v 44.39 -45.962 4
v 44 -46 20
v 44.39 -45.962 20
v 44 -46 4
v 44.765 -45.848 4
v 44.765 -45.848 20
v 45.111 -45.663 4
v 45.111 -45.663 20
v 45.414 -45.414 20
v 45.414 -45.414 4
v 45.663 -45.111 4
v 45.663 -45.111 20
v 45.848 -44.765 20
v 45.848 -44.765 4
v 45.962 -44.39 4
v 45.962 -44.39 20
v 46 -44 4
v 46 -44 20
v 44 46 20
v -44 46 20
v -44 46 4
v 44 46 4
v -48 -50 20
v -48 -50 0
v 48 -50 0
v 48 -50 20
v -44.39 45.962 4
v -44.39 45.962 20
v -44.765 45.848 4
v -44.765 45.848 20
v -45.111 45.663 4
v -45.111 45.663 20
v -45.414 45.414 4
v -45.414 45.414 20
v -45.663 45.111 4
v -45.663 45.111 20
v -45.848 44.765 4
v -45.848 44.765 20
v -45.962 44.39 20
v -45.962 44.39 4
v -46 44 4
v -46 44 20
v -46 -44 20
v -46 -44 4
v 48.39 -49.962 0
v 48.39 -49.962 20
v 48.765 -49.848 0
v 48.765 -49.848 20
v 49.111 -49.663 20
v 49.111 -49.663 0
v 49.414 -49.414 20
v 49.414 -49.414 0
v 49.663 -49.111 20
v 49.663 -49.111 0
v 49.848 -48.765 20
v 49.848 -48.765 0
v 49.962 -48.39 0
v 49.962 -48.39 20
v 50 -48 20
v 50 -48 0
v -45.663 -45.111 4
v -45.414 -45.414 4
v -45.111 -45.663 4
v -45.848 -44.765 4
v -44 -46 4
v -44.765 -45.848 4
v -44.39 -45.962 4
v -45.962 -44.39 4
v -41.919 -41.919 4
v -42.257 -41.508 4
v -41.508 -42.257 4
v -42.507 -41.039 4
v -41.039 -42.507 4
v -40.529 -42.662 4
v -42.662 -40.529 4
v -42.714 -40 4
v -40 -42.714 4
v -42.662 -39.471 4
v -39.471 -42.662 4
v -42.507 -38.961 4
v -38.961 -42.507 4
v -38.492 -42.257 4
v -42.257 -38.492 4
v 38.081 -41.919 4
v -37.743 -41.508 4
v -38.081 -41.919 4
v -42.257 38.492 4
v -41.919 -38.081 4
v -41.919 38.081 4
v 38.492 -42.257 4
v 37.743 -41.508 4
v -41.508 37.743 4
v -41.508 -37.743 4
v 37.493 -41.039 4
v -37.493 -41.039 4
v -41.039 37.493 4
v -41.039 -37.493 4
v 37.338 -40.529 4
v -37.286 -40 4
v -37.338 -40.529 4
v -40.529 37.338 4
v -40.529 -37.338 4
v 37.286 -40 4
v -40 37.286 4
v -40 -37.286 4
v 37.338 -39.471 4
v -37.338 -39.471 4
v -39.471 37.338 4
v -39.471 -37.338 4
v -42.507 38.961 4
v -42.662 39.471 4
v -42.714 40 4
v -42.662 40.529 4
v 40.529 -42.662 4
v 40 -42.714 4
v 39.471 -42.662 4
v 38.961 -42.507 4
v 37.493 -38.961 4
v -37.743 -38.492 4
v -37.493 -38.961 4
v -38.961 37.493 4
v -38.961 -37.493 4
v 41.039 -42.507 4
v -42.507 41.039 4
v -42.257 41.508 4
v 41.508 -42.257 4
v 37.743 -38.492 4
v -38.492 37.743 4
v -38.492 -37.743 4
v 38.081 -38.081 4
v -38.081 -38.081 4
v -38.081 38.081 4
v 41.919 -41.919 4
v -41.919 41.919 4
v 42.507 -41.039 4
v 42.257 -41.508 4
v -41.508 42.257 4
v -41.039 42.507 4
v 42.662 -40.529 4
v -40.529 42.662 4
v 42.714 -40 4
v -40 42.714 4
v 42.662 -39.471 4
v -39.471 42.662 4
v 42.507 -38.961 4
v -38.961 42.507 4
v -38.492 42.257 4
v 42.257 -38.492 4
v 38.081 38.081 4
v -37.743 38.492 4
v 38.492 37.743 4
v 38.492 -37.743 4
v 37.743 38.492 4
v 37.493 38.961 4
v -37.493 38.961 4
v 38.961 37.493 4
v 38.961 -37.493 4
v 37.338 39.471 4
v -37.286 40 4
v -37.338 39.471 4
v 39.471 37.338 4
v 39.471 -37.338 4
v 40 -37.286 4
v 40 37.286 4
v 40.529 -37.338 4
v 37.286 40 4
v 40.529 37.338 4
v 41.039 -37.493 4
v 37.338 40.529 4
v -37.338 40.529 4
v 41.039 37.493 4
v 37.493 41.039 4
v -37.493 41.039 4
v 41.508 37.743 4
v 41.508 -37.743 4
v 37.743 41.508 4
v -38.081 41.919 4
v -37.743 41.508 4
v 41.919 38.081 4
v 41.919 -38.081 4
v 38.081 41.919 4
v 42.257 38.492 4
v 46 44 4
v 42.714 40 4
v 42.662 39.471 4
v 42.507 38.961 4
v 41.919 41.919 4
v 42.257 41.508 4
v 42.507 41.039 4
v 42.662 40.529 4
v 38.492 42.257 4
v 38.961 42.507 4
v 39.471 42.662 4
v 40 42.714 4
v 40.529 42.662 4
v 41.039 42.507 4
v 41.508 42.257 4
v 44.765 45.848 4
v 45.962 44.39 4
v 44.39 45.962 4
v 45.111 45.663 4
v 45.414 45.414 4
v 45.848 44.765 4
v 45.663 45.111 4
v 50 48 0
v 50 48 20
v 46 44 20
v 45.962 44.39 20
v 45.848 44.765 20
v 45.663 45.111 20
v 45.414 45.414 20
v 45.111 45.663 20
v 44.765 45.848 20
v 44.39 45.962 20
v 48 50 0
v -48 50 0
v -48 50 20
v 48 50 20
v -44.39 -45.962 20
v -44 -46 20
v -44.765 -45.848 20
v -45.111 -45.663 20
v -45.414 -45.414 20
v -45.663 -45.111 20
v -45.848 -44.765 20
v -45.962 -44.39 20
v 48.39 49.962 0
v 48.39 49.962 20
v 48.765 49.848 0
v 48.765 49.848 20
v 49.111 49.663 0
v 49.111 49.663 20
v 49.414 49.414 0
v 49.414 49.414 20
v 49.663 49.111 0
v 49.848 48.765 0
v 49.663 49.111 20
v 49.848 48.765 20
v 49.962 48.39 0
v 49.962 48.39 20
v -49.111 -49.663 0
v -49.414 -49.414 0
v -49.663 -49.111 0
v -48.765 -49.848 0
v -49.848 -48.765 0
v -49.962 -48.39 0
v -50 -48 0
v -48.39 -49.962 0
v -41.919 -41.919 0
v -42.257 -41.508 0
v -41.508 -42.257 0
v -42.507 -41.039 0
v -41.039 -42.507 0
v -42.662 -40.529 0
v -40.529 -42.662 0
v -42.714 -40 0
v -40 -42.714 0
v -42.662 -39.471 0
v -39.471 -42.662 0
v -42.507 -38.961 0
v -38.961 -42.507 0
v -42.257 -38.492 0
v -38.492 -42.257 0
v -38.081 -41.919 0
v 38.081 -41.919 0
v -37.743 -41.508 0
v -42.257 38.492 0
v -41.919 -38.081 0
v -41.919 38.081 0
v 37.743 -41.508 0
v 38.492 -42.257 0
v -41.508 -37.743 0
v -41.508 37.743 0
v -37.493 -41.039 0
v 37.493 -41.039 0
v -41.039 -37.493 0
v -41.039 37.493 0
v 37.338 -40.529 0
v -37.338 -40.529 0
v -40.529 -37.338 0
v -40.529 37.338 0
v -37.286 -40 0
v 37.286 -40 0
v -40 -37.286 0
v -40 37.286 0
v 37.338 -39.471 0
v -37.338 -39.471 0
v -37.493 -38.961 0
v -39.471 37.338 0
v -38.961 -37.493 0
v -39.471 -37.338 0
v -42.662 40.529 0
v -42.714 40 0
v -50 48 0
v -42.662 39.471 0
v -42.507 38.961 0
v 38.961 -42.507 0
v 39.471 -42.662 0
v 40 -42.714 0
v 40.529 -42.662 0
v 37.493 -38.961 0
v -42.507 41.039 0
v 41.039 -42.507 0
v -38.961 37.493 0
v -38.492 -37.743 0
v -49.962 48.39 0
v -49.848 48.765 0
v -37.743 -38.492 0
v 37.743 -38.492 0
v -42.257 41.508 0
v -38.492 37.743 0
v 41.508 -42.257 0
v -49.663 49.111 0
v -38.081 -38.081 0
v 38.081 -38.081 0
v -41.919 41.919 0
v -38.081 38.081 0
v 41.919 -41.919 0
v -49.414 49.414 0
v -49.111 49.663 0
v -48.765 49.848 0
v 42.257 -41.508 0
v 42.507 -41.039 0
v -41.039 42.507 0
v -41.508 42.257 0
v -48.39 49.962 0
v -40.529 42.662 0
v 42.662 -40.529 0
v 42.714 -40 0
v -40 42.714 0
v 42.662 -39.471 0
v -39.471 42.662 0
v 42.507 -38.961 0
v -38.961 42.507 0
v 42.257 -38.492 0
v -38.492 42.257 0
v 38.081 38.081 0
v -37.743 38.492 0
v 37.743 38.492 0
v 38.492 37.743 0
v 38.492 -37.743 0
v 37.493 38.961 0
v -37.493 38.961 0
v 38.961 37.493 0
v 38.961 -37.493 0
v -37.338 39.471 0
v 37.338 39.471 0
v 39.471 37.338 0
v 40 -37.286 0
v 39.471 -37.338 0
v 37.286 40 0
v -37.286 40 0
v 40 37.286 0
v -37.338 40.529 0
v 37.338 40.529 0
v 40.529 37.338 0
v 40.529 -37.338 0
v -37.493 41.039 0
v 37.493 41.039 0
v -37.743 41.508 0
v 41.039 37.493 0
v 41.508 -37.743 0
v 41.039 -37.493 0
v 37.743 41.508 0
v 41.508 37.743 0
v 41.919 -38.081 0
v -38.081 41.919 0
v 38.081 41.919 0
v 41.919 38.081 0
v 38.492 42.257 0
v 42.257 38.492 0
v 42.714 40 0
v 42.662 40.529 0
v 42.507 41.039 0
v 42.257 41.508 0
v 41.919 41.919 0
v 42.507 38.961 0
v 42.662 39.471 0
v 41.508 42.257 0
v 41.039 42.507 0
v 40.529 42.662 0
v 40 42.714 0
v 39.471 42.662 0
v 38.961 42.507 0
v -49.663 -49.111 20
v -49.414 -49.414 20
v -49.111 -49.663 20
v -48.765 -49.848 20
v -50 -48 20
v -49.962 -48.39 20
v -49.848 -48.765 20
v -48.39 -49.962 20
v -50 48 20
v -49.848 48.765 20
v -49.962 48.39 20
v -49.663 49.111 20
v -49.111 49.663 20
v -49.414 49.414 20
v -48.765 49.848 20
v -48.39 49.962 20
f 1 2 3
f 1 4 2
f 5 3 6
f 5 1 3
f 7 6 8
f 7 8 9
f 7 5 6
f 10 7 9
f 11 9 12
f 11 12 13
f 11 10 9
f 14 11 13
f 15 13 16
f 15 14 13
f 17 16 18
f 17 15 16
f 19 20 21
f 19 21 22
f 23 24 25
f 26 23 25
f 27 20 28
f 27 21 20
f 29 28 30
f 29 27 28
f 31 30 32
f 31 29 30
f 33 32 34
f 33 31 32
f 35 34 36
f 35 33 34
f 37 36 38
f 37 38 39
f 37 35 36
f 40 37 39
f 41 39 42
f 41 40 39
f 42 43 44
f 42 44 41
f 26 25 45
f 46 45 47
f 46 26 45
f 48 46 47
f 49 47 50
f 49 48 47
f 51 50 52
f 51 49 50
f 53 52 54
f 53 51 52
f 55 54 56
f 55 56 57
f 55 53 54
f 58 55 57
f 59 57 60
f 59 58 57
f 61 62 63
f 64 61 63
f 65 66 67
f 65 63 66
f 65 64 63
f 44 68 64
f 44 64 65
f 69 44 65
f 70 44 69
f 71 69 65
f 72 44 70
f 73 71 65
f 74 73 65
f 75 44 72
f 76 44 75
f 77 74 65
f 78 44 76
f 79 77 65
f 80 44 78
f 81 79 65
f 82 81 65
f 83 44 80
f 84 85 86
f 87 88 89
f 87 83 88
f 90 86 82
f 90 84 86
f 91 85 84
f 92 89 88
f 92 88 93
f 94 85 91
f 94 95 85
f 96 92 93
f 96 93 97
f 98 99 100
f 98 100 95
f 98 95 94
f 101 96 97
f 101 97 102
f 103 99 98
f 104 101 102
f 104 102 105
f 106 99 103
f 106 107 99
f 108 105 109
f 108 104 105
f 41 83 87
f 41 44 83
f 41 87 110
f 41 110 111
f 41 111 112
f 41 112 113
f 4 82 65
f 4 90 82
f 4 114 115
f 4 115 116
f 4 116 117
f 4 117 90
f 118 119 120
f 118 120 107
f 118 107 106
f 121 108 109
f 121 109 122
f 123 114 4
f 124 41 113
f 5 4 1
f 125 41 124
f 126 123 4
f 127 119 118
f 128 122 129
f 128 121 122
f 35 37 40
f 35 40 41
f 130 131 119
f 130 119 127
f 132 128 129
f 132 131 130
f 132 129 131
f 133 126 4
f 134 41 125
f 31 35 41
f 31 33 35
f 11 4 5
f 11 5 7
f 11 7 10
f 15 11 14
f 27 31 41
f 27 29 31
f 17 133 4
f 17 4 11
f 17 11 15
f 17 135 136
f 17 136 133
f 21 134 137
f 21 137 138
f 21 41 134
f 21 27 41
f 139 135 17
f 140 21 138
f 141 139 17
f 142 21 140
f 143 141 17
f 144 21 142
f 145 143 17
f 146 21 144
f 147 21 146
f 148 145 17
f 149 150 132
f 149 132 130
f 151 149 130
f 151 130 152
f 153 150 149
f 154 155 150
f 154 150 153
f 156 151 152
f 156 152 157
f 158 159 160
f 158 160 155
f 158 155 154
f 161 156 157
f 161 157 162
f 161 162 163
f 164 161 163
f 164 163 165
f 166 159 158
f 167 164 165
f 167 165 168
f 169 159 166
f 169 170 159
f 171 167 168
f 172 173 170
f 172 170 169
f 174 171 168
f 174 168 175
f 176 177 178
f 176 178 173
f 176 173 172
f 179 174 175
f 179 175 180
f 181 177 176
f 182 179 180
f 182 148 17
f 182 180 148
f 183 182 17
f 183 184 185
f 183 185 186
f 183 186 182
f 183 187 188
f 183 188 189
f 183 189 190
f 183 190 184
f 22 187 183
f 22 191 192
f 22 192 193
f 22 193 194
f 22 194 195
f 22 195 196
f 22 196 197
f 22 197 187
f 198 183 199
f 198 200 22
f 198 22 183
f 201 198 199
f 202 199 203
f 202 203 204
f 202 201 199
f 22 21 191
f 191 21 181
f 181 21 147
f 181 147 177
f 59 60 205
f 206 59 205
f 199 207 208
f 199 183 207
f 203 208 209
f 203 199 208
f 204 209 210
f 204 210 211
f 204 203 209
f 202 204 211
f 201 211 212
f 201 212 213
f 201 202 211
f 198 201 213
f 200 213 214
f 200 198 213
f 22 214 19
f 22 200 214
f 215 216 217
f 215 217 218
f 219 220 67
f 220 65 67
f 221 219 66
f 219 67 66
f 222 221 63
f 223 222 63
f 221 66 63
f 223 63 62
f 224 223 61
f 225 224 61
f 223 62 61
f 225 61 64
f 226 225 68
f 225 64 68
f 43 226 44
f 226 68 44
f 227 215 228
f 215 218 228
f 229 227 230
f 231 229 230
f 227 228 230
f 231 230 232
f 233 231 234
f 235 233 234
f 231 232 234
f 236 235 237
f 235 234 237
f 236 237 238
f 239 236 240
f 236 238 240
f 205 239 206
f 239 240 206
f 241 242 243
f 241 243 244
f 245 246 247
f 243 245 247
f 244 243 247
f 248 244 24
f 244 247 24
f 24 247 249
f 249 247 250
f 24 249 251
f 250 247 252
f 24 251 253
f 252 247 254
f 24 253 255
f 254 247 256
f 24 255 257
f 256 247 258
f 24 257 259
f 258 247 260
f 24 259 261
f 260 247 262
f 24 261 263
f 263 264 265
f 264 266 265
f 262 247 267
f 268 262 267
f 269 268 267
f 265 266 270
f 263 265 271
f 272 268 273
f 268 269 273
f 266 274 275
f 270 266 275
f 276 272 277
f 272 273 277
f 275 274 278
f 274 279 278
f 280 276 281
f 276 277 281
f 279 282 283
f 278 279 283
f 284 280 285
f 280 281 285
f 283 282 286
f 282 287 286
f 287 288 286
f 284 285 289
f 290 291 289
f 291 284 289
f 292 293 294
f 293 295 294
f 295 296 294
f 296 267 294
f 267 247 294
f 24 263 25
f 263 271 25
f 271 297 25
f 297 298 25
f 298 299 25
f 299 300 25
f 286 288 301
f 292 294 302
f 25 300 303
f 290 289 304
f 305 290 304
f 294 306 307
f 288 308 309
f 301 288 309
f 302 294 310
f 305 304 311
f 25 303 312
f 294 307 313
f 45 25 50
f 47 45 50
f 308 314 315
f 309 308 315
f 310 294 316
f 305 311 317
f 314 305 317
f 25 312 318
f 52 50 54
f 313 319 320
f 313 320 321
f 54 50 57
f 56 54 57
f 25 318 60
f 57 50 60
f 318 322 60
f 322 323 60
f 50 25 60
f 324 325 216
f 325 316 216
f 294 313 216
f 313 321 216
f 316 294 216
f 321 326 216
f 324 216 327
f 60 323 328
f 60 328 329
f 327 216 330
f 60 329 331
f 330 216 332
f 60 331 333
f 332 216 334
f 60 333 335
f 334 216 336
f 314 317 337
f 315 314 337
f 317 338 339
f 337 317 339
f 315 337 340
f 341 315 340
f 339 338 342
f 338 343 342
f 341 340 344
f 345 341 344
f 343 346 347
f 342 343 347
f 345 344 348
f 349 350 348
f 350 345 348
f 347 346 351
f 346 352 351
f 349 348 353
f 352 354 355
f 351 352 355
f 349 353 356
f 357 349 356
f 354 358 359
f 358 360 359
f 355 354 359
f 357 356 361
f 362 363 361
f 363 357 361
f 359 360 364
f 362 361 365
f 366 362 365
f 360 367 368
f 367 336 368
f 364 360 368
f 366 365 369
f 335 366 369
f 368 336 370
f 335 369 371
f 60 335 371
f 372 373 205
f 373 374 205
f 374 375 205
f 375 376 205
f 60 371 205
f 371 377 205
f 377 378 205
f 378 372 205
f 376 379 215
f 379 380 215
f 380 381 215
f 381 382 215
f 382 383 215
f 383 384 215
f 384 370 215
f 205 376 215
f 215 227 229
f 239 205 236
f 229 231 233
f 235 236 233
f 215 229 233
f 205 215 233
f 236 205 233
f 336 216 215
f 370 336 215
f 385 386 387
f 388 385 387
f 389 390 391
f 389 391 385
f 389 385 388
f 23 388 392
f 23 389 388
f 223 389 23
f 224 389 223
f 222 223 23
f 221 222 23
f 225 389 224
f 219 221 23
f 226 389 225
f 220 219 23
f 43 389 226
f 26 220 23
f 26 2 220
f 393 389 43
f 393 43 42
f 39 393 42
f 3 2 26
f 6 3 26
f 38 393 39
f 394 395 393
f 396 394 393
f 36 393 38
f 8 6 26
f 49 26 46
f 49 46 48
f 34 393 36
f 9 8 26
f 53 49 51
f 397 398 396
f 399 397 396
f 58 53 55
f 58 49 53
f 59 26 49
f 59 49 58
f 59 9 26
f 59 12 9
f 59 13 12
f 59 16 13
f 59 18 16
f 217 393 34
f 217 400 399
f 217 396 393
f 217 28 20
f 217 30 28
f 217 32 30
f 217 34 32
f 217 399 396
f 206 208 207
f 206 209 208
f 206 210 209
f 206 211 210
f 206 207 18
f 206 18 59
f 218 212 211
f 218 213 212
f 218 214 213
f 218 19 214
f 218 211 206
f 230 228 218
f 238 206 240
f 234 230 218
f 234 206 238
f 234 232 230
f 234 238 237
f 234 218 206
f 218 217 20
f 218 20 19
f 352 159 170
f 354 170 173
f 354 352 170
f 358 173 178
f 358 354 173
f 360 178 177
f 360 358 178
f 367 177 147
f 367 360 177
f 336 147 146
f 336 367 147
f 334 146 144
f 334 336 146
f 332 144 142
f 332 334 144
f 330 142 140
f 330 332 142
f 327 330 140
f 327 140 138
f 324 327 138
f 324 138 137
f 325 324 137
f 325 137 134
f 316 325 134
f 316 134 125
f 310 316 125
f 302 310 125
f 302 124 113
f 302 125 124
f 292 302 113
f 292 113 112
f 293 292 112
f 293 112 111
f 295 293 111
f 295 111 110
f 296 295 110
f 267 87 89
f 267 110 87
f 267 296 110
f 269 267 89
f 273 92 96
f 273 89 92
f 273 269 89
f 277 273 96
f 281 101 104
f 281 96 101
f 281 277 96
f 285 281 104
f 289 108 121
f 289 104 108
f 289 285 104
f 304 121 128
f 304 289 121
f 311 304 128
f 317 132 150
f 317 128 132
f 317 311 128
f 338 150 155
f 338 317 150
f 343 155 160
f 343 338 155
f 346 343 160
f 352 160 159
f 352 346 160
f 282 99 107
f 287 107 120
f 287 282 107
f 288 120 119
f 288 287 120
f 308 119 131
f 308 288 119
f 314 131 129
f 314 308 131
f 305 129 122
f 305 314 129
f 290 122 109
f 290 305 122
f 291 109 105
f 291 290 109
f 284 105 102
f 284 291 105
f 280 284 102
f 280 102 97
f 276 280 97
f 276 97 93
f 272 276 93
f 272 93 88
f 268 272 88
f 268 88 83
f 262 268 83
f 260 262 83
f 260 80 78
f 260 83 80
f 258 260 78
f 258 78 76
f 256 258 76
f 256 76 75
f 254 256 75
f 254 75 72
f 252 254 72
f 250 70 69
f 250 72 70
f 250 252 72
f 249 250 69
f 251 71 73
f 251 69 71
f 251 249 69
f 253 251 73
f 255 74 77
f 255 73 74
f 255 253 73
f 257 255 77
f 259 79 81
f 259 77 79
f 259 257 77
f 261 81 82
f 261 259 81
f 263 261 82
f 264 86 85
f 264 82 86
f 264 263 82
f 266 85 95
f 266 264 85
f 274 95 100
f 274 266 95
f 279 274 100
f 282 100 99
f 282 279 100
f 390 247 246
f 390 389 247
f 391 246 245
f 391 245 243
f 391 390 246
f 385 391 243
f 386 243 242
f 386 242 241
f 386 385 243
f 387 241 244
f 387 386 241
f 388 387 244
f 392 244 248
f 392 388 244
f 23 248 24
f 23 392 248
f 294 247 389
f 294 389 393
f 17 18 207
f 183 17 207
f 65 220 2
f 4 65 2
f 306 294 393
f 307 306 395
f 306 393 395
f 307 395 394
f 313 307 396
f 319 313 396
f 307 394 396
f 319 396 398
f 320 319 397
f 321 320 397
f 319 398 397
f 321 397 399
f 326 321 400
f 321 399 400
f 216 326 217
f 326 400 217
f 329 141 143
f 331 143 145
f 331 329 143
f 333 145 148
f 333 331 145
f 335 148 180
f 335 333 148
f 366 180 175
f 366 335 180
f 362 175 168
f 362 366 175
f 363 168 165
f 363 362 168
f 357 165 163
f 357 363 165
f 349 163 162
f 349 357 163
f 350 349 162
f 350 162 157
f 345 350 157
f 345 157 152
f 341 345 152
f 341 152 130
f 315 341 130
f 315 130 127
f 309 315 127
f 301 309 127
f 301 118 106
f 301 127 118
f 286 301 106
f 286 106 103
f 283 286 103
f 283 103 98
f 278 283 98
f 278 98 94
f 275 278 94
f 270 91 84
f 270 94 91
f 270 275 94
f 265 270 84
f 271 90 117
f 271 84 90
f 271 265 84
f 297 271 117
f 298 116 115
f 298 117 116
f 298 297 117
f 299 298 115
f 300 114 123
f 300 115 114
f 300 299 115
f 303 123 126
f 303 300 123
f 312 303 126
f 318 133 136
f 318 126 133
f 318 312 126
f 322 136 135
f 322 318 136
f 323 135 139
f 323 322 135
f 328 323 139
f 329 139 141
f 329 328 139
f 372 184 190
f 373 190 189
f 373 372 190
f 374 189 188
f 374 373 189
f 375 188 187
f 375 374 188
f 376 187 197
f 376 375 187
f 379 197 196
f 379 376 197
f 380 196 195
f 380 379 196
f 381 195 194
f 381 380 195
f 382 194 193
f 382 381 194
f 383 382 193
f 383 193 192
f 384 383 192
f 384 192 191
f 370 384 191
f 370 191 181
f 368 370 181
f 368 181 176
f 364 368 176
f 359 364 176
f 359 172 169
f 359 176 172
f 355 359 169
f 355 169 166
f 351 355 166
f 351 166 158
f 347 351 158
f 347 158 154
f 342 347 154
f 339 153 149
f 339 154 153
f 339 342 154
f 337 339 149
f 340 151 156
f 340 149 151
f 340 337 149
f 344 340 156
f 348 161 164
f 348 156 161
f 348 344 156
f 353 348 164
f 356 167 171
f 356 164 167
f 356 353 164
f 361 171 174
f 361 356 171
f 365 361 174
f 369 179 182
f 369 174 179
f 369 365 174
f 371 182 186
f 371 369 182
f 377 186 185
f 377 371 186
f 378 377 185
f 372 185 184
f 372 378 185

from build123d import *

# Parameters (mm, degrees)
SKETCH1_W           = 100
SKETCH1_H           = 100
BOSS_EXTRUDE1_DEPTH = 20
SKETCH2_W           = 92
SKETCH2_H           = 92
CUT_EXTRUDE1_DEPTH  = 16
FILLET1_R           = 2
SKETCH3_R           = 2.713966801
CUT_EXTRUDE2_DEPTH  = 16


with BuildPart() as part:
    # Sketch1 → Boss-Extrude1 (new body)
    with BuildSketch(Plane.XY):
        Rectangle(SKETCH1_W, SKETCH1_H)
    extrude(amount=BOSS_EXTRUDE1_DEPTH)

    # Sketch2 → Cut-Extrude1 (cut)
    with BuildSketch(Plane.XY.offset(20)):
        Rectangle(SKETCH2_W, SKETCH2_H)
    extrude(amount=-CUT_EXTRUDE1_DEPTH, mode=Mode.SUBTRACT)

    # Fillet1
    fillet1_edges = [part.edges().sort_by_distance(p)[0] for p in [
        (-46, -46, 12),
        (-46, 46, 12),
        (46, 46, 12),
        (46, -46, 12),
        (-50, 50, 10),
        (50, 50, 10),
        (50, -50, 10),
        (-50, -50, 10),
    ]]
    fillet(fillet1_edges, radius=FILLET1_R)

    # Sketch3 → Cut-Extrude2 (cut)
    with BuildSketch(Plane.XY):
        with Locations((-40, 40)):
            Circle(SKETCH3_R)
        with Locations((40, 40)):
            Circle(SKETCH3_R)
        with Locations((40, -40)):
            Circle(SKETCH3_R)
        with Locations((-40, -40)):
            Circle(SKETCH3_R)
    extrude(amount=CUT_EXTRUDE2_DEPTH, mode=Mode.SUBTRACT)


solid = part.part
